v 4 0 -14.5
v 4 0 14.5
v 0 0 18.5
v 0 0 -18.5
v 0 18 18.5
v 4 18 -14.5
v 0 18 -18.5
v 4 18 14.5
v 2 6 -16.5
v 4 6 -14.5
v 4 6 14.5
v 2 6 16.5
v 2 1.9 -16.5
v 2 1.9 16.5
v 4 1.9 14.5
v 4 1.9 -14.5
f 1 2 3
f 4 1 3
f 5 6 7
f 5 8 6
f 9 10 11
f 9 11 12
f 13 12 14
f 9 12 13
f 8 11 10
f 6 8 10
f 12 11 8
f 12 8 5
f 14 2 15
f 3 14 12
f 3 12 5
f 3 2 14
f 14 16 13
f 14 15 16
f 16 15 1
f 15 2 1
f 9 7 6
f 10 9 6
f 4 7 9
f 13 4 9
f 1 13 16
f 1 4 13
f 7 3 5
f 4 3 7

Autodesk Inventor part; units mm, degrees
ref_plane "YZ Plane" through (0, 0, 0) normal (1, 0, 0) x (0, 1, 0)
ref_plane "XZ Plane" through (0, 0, 0) normal (0, 1, 0) x (-1, 0, 0)
ref_plane "XY Plane" through (0, 0, 0) normal (0, 0, 1) x (1, 0, 0)
sketch "Sketch1" plane through (0, 0, 0) normal (0, 1, 0) x (-1, 0, 0)
  line L0 (0, 18.5) -> (0, -18.5)
  line L1 (-4, 14.5) -> (-4, -14.5)
  line L2 (0, 0) -> (-19.6483, 0) construction
  line L3 (-4, 14.5) -> (0, 18.5)
  line L4 (0, -18.5) -> (-4, -14.5)
  point P0 (-4, 0)
  dimension "d6" = 37
  dimension "d7" = 29
  dimension "d8" = 4
extrude "Extrusion1" add sketch "Sketch1" along normal blind 18
sketch "Sketch2" plane through (4, 0, 14.5) normal (1, 0, 0) x (0, 0, -1)
  line L0 (-4, 0) -> (-4, 18) projected
  line L1 (33, 0) -> (33, 18) projected
  line L2 (-4, 6) -> (33, 6)
  line L3 (33, 6) -> (33, 1.9)
  line L4 (33, 1.9) -> (-4, 1.9)
  line L5 (-4, 1.9) -> (-4, 6)
  line L6 (0, 0) -> (29, 0) projected
  point P0 (14.5, 0)
  point P1 (-4, 1.9)
  dimension "d11" = 4.1
  dimension "d12" = 1.9
extrude "Extrusion2" cut sketch "Sketch2" against normal blind 2
properties part number "long PDMS Chamber top-bottom"
